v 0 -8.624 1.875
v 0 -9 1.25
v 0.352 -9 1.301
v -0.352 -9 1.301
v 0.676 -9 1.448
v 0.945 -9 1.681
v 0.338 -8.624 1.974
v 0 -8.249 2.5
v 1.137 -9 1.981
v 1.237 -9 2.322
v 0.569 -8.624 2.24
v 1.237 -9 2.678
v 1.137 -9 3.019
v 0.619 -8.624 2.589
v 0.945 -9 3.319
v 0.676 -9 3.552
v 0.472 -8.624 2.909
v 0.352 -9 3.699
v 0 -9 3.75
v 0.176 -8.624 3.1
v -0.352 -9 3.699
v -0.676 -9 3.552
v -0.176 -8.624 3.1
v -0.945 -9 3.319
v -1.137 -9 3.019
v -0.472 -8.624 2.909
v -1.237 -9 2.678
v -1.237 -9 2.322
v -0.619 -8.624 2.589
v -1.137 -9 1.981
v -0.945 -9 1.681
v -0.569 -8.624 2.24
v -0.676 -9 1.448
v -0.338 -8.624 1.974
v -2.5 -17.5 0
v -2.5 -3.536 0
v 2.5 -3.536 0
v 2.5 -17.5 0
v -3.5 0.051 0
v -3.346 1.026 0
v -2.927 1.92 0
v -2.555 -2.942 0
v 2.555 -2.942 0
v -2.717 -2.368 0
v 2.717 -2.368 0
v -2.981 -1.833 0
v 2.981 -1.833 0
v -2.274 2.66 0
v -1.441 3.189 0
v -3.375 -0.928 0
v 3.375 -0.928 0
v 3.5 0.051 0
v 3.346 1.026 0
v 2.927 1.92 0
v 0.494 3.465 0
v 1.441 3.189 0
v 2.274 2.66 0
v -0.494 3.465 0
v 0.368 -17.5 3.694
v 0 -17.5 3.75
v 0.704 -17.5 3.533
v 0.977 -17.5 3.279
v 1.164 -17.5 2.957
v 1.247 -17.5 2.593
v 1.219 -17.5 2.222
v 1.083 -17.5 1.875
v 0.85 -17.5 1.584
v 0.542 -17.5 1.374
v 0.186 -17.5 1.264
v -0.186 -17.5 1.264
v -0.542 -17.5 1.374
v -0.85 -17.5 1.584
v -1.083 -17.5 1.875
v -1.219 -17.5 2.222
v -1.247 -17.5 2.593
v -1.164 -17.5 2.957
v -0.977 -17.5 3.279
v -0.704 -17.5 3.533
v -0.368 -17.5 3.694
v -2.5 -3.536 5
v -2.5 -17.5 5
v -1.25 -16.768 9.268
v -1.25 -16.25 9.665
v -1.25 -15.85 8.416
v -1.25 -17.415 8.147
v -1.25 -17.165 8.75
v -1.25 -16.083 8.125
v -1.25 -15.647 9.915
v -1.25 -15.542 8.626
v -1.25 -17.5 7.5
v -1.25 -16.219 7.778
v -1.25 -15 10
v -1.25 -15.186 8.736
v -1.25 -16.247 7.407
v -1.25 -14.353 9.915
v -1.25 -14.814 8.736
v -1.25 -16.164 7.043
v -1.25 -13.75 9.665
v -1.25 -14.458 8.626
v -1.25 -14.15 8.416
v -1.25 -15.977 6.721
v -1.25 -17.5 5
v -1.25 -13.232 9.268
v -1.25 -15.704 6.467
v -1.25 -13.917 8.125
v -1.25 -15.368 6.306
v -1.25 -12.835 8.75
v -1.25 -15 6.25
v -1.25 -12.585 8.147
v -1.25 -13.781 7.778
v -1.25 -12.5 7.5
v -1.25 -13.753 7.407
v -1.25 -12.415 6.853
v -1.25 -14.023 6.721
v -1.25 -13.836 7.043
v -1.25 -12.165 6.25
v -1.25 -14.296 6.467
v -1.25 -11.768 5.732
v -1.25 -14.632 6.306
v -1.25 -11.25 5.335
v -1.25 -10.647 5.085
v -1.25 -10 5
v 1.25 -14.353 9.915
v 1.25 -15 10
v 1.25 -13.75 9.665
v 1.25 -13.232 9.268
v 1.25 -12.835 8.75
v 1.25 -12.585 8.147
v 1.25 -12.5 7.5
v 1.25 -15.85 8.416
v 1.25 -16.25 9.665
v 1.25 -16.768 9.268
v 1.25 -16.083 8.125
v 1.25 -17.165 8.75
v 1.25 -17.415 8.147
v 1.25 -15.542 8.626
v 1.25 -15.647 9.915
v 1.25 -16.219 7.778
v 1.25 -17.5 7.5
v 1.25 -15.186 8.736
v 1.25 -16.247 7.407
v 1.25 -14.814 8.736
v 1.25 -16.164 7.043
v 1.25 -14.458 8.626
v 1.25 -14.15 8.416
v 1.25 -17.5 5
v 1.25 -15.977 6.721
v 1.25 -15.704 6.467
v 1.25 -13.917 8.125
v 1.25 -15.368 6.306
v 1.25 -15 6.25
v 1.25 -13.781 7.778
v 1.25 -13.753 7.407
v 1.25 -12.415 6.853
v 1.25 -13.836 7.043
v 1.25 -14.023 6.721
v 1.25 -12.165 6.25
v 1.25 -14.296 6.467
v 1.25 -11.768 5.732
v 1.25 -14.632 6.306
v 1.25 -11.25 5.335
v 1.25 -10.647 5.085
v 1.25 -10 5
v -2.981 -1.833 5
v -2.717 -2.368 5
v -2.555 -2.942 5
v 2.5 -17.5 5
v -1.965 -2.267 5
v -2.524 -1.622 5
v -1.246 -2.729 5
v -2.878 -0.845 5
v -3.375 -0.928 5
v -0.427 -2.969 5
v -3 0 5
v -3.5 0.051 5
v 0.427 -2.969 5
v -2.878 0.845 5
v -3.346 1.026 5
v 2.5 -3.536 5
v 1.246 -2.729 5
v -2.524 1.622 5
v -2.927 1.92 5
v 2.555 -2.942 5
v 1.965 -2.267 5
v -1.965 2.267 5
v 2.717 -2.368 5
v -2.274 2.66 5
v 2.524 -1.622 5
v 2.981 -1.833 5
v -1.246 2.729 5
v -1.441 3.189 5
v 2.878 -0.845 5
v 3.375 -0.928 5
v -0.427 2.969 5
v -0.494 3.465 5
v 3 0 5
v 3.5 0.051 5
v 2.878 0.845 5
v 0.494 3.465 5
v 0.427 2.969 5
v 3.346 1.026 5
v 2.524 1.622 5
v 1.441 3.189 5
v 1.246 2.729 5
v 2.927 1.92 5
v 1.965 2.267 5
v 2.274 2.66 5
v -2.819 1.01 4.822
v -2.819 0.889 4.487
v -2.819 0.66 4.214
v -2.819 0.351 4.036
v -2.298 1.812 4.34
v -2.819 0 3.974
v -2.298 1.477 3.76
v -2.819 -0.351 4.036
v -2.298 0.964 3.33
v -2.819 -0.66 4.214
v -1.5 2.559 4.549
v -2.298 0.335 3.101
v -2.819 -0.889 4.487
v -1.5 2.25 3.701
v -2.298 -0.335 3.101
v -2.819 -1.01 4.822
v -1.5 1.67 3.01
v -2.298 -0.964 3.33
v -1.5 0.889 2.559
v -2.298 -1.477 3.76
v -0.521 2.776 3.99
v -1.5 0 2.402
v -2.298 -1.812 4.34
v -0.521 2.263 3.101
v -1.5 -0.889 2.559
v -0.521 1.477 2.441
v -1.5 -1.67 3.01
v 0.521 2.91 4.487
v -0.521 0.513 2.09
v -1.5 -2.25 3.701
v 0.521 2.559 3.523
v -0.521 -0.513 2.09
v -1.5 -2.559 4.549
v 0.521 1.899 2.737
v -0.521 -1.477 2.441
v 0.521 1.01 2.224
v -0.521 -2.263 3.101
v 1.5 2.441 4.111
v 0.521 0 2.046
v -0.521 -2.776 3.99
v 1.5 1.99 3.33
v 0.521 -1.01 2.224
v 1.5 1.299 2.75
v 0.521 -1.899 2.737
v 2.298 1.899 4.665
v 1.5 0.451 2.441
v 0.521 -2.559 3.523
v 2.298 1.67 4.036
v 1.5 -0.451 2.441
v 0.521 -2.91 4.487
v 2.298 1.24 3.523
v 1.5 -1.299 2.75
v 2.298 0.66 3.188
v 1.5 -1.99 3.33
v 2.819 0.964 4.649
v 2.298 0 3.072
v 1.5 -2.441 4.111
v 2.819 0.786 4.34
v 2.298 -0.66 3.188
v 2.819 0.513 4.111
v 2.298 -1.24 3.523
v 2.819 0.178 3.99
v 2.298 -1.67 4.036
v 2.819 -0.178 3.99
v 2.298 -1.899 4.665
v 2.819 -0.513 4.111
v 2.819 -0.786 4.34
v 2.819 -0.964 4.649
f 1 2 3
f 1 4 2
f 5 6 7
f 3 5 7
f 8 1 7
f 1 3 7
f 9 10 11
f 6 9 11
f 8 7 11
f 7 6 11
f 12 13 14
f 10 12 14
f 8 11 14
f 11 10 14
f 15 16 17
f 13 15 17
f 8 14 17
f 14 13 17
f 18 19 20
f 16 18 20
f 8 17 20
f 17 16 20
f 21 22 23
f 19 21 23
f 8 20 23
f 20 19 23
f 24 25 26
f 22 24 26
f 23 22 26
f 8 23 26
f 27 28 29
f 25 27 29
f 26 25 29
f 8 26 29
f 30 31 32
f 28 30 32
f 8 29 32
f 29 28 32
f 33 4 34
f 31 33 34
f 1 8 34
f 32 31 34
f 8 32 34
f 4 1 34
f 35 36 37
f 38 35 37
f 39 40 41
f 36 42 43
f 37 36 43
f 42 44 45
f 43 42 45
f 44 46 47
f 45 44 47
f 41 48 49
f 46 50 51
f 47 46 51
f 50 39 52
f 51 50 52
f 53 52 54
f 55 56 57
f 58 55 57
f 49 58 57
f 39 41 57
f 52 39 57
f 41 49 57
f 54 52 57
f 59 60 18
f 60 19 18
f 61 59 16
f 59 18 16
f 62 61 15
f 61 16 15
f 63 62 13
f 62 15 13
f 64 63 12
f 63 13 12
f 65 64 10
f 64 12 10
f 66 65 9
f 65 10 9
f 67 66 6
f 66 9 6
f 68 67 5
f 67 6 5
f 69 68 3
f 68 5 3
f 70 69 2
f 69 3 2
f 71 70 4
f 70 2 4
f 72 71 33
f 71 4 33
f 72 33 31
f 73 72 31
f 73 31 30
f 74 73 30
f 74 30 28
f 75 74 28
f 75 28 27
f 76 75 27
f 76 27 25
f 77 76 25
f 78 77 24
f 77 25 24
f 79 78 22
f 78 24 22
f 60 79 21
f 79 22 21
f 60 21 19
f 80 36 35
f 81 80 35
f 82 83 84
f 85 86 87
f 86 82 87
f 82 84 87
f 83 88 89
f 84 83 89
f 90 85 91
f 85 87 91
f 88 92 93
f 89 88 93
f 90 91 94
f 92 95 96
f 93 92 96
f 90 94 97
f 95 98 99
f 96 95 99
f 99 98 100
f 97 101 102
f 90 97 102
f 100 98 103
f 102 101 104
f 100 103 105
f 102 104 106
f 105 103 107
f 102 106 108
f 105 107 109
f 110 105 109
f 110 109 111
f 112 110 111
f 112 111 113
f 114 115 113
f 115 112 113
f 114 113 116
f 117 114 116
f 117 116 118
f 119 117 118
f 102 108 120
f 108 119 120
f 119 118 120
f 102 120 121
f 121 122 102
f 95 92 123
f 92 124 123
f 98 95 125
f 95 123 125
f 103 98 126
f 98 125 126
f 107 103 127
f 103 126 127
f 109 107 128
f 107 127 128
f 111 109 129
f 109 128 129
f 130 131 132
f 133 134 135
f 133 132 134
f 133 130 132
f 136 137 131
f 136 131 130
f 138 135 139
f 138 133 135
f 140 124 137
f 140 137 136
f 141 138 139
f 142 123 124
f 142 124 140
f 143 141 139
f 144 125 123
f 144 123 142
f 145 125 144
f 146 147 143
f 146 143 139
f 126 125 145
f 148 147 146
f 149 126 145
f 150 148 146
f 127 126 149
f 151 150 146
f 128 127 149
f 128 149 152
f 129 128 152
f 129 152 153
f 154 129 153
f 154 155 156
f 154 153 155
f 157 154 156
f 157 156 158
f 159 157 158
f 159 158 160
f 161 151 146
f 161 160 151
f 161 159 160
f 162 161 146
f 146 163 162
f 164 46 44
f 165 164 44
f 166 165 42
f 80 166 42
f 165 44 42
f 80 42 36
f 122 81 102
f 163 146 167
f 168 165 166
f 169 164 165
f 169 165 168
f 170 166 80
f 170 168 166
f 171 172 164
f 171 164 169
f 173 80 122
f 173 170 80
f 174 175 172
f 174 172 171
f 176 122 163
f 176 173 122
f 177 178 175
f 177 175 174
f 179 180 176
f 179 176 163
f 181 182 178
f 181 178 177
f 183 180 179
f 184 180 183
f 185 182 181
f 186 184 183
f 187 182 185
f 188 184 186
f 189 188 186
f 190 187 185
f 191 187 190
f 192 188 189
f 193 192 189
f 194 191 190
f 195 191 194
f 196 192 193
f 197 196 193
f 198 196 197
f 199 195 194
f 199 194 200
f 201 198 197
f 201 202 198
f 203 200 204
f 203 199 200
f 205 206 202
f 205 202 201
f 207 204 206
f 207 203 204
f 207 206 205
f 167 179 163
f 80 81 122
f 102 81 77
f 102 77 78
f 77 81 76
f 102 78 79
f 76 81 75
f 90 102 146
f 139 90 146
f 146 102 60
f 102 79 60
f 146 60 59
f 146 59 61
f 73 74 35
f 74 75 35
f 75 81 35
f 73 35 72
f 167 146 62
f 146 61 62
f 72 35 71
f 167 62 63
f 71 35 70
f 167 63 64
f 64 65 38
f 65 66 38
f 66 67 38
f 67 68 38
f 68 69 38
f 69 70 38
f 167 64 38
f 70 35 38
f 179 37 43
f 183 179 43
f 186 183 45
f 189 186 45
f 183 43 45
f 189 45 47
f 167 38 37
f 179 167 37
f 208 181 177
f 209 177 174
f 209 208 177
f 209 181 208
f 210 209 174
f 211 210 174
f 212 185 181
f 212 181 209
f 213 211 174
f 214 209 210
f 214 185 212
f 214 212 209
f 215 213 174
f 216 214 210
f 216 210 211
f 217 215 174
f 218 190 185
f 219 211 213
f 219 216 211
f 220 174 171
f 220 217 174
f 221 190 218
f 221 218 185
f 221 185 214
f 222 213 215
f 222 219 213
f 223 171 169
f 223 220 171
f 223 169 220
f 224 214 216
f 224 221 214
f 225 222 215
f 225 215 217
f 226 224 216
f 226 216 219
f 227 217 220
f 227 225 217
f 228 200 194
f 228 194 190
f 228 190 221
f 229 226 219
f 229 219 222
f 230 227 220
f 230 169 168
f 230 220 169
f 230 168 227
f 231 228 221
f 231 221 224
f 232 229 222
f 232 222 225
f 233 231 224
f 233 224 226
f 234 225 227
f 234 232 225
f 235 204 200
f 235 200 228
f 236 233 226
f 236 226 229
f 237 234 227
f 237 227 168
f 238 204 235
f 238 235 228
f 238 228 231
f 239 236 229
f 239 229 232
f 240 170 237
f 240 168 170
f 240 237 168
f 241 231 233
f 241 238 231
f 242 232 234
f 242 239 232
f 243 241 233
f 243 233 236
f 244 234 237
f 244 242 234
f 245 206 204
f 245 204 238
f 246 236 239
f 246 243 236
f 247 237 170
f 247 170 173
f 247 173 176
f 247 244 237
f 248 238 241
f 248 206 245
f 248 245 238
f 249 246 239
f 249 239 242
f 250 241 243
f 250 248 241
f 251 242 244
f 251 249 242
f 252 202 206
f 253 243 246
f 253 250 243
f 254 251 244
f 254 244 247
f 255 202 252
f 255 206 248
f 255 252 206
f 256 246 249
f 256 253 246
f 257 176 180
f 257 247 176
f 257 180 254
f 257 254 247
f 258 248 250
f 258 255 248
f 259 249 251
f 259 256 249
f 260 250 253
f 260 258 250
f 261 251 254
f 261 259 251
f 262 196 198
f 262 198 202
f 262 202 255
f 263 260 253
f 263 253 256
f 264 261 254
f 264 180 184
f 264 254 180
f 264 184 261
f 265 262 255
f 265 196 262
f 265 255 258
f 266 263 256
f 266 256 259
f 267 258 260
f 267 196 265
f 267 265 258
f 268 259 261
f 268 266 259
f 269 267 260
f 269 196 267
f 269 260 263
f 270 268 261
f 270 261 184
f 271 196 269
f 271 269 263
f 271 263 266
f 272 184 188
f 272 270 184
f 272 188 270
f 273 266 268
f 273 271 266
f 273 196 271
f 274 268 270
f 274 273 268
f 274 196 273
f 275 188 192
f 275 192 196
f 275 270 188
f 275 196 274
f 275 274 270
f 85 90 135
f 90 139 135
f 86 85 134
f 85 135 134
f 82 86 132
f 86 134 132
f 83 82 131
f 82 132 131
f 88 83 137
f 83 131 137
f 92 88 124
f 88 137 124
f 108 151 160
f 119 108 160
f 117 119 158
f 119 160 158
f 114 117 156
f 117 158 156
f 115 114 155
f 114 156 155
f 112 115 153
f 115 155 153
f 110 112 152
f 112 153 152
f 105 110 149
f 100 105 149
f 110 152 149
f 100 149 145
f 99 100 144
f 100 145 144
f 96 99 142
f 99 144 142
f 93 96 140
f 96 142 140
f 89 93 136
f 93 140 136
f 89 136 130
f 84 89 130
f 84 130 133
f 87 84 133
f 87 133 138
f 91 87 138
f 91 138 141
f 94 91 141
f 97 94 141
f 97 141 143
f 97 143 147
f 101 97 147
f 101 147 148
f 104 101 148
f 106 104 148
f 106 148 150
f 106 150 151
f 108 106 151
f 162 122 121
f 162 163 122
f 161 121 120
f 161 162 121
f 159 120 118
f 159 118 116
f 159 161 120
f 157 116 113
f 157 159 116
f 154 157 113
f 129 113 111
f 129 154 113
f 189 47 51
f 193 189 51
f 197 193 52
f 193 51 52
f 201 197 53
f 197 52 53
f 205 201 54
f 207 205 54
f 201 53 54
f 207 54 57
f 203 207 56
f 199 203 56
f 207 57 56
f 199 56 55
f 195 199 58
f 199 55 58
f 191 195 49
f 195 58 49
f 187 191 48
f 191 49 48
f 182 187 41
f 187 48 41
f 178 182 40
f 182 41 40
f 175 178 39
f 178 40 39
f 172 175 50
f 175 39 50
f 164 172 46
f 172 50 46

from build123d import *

# Parameters (mm, degrees)
AUFSATZ_LINEAR_AUSTRAGEN1_DEPTH      = 5
AUFSATZ_LINEAR_AUSTRAGEN2_DEPTH      = 1.25
AUFSATZ_LINEAR_AUSTRAGEN2_DEPTH_BACK = 1.25
SKIZZE2_W                            = 5
SKIZZE2_H                            = 5
SKIZZE3_R                            = 1.25
SCHNITT_LINEAR_AUSTRAGEN1_DEPTH      = 3.25
M3_GEWINDEBOHRUNG1_D                 = 2.5
M3_GEWINDEBOHRUNG1_DEPTH             = 8.5
M3_GEWINDEBOHRUNG1_TIP               = 0.751075774
VERRUNDUNG1_R                        = 2.5


with BuildPart() as part:
    # Skizze1 → Aufsatz-Linear austragen1 (new body)
    with BuildSketch(Plane.XY):
        with BuildLine():
            Line((-2.5, -3.535533906), (-2.5, -17.5))
            Line((-2.5, -17.5), (2.5, -17.5))
            Line((2.5, -17.5), (2.5, -3.535533906))
            ThreePointArc((2.5, -3.535533906), (2.622686042, -2.650995943), (2.981481481, -1.833239803))
            ThreePointArc((2.981481481, -1.833239803), (0, 3.5), (-2.981481481, -1.833239803))
            ThreePointArc((-2.981481481, -1.833239803), (-2.622686042, -2.650995943), (-2.5, -3.535533906))
        make_face()
    extrude(amount=AUFSATZ_LINEAR_AUSTRAGEN1_DEPTH)

    # Skizze2 → Aufsatz-Linear austragen2 (add, two sides: drawn at the far end of the back side and taken through both)
    with BuildSketch(Plane(origin=(0, 0, 0), x_dir=(0, 0, -1), z_dir=(1, 0, 0)).offset(-AUFSATZ_LINEAR_AUSTRAGEN2_DEPTH_BACK)):
        with Locations((-7.5, -15)):
            Rectangle(SKIZZE2_W, SKIZZE2_H)
    extrude(amount=AUFSATZ_LINEAR_AUSTRAGEN2_DEPTH + AUFSATZ_LINEAR_AUSTRAGEN2_DEPTH_BACK)

    # Skizze3 → Schnitt-Linear austragen1 (cut)
    with BuildSketch(Plane(origin=(1.25, 0, 0), x_dir=(0, 0, -1), z_dir=(1, 0, 0))):
        with Locations((-7.5, -15)):
            Circle(SKIZZE3_R)
    extrude(amount=-SCHNITT_LINEAR_AUSTRAGEN1_DEPTH, mode=Mode.SUBTRACT)

    # Skizze4 → Schnitt-Rotation1 (revolve, cut)
    with BuildSketch(Plane(origin=(0, 0, 0), x_dir=(1, 0, 0), z_dir=(0, 1, 0))):
        with BuildLine():
            Line((3, -5), (-3, -5))
            ThreePointArc((-3, -5), (0, -2), (3, -5))
        make_face()
    revolve(axis=Axis((7.725672482, 0, 5), (-1, 0, 0)), mode=Mode.SUBTRACT)

    # M3 Gewindebohrung1
    with Locations(Plane(origin=(0, -17.5, 2.5), x_dir=(0, 0, -1), z_dir=(0, -1, 0))):
        with Locations((0, 0)):
            Hole(M3_GEWINDEBOHRUNG1_D / 2, depth=M3_GEWINDEBOHRUNG1_DEPTH)
            with Locations((0, 0, -(M3_GEWINDEBOHRUNG1_DEPTH + M3_GEWINDEBOHRUNG1_TIP / 2))):  # 118° drill point
                Cone(0, M3_GEWINDEBOHRUNG1_D / 2, M3_GEWINDEBOHRUNG1_TIP, mode=Mode.SUBTRACT)

    # Verrundung1
    verrundung1_edges = [part.edges().sort_by_distance(p)[0] for p in [
        (0, -12.5, 5),
        (0, -12.5, 10),
        (0, -17.5, 10),
    ]]
    fillet(verrundung1_edges, radius=VERRUNDUNG1_R - 0.0001)  # a hair under: the kernel refuses the full size


solid = part.part
